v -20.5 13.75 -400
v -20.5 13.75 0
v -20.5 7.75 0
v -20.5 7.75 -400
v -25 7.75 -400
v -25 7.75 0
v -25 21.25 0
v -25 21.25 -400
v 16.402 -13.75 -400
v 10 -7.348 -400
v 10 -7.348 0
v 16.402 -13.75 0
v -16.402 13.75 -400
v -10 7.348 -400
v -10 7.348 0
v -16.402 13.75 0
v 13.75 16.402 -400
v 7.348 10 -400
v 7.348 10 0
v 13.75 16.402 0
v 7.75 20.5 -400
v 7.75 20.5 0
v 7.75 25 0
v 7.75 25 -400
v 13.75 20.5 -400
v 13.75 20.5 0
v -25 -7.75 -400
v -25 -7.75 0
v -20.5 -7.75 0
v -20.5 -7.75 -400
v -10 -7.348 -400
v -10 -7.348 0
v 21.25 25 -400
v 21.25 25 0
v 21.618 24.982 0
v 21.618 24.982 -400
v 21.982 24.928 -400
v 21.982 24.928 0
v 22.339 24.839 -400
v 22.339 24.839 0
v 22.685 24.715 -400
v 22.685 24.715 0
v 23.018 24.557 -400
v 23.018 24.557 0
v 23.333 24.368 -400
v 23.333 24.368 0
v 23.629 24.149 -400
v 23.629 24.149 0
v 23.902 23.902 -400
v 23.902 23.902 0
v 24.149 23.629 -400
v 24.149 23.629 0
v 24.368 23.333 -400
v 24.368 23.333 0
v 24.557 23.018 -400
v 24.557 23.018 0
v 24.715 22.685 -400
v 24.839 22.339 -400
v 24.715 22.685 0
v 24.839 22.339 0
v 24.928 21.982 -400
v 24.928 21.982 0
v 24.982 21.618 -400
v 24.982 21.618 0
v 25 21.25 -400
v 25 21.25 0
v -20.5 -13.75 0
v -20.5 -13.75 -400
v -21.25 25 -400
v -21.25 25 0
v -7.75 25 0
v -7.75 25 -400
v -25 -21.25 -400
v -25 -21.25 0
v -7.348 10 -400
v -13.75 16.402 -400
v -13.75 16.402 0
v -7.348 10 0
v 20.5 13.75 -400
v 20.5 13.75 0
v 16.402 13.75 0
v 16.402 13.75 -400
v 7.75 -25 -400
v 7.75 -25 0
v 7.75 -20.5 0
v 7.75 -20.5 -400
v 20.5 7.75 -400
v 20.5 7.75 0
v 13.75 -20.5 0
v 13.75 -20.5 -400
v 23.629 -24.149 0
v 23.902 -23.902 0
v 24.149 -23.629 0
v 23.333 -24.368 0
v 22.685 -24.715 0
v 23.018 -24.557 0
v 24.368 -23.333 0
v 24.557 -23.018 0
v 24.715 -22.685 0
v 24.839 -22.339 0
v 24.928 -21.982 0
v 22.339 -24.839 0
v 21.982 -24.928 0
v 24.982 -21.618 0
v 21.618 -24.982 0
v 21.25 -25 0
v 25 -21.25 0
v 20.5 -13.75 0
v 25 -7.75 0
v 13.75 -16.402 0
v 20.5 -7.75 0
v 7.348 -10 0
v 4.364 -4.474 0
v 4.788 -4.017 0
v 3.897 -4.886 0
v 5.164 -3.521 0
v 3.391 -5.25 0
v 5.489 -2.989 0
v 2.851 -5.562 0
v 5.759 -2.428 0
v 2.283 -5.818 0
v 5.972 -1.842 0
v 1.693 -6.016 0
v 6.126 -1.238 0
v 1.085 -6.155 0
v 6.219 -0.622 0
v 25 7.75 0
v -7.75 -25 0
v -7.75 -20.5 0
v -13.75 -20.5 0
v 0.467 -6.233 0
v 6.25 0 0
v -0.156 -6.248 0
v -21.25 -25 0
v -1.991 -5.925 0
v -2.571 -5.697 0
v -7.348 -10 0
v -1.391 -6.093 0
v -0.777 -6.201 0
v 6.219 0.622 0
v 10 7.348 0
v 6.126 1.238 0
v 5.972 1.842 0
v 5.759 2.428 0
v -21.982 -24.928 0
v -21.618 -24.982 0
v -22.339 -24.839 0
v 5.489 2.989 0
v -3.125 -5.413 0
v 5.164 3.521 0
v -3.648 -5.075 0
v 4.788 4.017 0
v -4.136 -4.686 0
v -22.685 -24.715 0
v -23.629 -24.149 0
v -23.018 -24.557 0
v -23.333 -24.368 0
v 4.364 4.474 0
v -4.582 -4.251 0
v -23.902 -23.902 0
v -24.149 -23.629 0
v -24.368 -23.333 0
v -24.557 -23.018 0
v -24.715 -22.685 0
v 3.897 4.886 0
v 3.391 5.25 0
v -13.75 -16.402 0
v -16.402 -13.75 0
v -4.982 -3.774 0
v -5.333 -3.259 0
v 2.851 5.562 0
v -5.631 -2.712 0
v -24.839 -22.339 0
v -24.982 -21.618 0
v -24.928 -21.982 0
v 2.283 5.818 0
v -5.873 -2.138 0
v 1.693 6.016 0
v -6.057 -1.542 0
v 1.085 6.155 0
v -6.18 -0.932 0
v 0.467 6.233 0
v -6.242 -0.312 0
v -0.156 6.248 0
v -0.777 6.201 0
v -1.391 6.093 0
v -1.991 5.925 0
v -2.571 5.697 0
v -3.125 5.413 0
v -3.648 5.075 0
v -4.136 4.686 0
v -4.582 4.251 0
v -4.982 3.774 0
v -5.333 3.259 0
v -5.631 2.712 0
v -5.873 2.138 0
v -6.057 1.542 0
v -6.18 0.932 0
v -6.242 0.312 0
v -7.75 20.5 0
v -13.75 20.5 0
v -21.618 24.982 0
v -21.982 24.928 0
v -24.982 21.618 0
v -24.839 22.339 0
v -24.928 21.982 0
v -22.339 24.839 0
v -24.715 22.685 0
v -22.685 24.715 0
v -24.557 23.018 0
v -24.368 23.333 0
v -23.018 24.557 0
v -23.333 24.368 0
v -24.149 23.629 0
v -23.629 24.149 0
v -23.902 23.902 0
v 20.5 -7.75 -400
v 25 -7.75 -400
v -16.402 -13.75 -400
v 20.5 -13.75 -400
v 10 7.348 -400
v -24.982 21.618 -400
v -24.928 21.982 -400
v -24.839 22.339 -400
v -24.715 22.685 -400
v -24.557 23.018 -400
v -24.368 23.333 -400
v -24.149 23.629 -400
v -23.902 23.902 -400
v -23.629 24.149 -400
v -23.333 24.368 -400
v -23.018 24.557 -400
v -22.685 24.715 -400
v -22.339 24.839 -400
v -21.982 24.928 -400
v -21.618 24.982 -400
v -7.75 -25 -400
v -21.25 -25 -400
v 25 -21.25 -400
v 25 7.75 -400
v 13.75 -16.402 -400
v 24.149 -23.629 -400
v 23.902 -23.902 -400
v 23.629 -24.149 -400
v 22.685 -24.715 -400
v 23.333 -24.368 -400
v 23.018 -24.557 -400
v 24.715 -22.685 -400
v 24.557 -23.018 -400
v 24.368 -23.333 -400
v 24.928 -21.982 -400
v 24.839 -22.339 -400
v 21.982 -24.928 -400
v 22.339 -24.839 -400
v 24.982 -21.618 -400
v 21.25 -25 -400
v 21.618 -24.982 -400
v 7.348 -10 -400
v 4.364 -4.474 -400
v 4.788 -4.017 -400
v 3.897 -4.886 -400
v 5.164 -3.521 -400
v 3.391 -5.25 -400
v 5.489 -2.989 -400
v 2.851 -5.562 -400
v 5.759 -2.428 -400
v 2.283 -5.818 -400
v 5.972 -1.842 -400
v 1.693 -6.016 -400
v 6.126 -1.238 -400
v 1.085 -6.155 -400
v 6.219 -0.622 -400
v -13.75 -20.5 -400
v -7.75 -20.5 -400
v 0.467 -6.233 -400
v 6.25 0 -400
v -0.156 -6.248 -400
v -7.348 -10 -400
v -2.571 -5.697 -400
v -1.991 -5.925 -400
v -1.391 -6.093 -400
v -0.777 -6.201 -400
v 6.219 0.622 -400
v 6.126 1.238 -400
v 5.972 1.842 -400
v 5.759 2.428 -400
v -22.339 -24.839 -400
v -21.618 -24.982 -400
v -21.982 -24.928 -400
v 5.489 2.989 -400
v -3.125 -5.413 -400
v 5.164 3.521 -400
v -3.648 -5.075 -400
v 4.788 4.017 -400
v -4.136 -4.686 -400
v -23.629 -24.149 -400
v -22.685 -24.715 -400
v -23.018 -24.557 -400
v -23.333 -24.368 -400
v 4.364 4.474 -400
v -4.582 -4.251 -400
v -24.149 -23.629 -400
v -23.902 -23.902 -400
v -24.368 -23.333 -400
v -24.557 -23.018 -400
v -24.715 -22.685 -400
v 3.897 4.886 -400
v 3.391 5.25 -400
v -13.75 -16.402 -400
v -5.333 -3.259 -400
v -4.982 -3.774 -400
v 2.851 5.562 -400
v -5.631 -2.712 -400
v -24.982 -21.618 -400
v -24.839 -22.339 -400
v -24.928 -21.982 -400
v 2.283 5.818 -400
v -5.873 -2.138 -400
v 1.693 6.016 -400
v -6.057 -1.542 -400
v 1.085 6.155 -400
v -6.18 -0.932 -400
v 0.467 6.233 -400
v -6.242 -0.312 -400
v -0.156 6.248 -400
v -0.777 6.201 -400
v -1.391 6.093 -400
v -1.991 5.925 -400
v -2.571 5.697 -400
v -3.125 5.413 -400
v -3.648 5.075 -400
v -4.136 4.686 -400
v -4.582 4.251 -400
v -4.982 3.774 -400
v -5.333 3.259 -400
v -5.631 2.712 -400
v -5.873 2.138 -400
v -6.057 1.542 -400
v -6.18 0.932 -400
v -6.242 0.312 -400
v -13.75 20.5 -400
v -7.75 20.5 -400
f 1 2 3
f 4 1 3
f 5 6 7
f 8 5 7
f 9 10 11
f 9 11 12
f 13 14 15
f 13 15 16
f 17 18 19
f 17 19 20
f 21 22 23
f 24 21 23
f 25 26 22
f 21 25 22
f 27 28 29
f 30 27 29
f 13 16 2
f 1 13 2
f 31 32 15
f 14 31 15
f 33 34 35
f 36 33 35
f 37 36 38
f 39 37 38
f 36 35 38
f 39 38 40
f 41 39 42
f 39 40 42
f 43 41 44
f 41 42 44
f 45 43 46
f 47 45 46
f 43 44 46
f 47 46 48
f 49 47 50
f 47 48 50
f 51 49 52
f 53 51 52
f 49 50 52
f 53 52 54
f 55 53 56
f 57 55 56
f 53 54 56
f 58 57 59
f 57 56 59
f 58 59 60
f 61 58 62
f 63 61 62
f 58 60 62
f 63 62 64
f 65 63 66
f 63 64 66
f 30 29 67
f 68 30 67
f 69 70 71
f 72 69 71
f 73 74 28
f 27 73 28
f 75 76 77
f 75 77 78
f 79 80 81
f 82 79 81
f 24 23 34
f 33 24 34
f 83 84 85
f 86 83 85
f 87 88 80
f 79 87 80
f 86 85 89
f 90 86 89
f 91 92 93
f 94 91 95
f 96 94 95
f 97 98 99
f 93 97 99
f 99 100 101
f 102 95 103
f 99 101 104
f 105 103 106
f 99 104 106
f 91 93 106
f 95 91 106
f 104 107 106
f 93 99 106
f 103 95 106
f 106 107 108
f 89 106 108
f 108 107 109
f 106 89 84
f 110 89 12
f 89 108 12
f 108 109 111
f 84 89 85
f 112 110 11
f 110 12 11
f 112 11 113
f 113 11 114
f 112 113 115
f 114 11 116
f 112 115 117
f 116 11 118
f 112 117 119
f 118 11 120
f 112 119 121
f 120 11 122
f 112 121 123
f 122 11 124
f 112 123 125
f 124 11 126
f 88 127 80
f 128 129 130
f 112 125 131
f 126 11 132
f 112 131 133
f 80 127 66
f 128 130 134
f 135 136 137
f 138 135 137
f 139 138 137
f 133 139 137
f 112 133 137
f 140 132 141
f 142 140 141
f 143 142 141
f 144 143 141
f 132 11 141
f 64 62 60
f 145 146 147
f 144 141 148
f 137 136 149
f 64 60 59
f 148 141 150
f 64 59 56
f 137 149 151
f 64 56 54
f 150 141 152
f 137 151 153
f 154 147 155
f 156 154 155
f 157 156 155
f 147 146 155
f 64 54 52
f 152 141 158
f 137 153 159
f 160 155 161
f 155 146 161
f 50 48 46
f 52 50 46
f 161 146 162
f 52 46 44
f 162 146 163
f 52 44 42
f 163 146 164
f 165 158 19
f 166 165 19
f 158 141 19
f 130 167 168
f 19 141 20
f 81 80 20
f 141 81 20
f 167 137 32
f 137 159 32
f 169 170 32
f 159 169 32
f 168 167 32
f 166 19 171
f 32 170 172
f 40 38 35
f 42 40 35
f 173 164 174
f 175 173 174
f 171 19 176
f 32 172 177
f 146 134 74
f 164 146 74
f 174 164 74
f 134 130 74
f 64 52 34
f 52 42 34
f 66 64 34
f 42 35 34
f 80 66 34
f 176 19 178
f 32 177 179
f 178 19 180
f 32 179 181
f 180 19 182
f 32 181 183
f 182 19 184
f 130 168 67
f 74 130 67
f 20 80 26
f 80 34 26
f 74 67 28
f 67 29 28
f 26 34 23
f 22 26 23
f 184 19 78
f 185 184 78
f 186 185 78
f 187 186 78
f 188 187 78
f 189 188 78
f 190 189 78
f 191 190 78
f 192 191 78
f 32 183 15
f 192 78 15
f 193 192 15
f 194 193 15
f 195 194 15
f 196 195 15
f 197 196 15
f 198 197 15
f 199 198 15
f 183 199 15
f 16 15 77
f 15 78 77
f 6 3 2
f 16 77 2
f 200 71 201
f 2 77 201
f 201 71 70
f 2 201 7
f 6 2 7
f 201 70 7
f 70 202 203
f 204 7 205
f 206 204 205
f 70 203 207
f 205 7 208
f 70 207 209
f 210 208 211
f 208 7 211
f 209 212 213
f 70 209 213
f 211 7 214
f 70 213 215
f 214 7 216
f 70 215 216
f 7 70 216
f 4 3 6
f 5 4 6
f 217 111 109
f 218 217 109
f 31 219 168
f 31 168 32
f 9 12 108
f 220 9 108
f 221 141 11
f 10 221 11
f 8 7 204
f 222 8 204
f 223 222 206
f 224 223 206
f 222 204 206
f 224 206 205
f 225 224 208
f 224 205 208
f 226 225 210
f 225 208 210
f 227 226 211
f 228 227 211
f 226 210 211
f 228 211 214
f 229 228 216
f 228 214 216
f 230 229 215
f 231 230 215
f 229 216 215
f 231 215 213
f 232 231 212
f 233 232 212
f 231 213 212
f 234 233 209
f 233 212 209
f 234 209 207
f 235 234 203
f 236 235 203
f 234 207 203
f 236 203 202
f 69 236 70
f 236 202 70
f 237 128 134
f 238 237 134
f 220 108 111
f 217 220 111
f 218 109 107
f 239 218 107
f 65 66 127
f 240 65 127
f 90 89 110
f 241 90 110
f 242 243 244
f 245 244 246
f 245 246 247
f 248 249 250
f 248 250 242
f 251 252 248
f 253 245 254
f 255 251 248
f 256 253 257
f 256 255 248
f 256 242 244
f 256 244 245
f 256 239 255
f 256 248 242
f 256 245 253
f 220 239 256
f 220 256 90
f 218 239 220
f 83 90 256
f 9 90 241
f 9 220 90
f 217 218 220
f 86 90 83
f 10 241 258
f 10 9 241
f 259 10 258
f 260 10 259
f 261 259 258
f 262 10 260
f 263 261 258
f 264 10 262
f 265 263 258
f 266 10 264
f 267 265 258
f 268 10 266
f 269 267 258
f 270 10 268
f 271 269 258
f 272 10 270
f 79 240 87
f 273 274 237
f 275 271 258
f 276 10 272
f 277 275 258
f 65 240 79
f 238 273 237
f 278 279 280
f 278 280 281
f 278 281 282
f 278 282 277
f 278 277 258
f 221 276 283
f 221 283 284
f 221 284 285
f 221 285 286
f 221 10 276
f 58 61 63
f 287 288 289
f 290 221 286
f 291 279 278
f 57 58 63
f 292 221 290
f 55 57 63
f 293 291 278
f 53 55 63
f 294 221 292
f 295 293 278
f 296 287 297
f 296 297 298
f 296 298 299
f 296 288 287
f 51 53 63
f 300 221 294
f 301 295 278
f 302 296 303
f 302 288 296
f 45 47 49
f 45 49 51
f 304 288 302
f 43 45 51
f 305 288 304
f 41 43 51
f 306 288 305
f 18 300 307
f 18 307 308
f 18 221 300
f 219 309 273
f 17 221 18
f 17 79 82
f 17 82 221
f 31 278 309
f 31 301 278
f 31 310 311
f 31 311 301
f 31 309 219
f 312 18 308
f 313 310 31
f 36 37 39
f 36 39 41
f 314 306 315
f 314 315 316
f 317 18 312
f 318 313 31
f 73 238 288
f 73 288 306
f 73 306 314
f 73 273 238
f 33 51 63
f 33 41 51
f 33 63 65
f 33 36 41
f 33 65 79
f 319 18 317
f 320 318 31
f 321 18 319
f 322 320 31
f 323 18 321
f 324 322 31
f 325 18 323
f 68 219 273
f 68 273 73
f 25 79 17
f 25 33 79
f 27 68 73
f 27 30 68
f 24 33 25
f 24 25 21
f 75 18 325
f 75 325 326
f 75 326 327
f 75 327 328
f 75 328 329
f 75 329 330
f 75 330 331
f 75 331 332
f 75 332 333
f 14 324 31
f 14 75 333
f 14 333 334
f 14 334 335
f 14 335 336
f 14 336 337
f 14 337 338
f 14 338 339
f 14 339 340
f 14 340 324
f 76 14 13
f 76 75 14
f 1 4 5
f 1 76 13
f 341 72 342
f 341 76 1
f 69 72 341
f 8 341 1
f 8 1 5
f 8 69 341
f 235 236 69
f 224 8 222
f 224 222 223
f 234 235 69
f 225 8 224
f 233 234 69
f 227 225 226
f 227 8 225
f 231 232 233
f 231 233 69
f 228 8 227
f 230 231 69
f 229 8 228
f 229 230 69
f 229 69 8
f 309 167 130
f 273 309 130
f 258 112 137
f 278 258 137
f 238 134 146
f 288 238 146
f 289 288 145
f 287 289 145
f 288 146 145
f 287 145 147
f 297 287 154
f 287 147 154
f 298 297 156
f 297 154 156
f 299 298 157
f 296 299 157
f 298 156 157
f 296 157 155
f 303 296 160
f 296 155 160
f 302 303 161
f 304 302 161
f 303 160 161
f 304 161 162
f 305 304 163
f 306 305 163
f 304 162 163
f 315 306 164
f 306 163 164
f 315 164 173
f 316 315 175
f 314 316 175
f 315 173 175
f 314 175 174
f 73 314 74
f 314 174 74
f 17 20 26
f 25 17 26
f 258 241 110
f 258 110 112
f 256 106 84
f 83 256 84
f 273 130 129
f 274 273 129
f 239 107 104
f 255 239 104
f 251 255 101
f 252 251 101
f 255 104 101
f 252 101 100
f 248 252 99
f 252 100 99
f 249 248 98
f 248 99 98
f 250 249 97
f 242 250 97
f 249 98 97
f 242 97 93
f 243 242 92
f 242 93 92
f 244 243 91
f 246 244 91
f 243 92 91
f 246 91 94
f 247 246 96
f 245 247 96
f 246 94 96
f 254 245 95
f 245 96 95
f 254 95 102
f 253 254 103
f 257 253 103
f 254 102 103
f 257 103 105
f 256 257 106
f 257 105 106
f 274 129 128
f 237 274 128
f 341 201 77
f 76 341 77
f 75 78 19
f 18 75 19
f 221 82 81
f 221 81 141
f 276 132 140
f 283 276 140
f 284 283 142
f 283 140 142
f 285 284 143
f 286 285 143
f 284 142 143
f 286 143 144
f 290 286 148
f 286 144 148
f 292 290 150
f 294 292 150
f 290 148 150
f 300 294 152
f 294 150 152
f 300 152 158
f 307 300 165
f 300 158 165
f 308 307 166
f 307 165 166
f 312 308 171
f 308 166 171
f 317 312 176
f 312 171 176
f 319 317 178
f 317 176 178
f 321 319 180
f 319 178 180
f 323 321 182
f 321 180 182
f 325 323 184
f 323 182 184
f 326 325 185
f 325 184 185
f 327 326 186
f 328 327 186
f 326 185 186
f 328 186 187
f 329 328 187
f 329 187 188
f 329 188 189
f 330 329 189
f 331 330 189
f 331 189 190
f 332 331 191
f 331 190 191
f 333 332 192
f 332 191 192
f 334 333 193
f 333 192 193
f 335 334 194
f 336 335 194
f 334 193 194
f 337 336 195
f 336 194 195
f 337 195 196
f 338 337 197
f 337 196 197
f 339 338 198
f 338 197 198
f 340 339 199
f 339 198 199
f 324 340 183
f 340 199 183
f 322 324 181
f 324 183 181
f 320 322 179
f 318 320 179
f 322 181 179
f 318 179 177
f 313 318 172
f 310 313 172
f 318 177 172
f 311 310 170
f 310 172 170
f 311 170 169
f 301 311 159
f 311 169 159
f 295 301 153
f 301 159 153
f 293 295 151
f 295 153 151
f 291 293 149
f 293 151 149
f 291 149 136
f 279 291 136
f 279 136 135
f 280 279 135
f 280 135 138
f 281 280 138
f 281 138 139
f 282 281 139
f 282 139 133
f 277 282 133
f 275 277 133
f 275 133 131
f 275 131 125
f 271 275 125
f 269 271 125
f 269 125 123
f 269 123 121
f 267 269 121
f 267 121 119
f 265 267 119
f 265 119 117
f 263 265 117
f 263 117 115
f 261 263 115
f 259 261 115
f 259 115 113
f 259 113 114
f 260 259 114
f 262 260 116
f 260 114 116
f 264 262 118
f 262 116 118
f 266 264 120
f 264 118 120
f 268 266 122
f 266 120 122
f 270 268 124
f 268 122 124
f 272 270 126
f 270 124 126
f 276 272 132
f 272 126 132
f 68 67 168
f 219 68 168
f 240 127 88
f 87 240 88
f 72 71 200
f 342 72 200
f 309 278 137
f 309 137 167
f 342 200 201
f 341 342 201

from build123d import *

# Parameters (mm, degrees)
SKETCH_1_R      = 2.5
EXTRUDE_2_DEPTH = 160
SCALE1_SCALE    = 2.5


with BuildPart() as part:
    # 草图1 → 凸台-拉伸2 (new body)
    with BuildSketch(Plane.XY):
        with BuildLine():
            Line((5.5, -8.2), (5.5, -6.560660172))
            Line((5.5, -6.560660172), (2.939339828, -4))
            Line((2.939339828, -4), (-2.939339828, -4))
            Line((-2.939339828, -4), (-5.5, -6.560660172))
            Line((-5.5, -6.560660172), (-5.5, -8.2))
            Line((-5.5, -8.2), (-3.1, -8.2))
            Line((-3.1, -8.2), (-3.1, -10))
            Line((-3.1, -10), (-8.5, -10))
            ThreePointArc((-8.5, -10), (-9.560660172, -9.560660172), (-10, -8.5))
            Line((-10, -8.5), (-10, -3.1))
            Line((-10, -3.1), (-8.2, -3.1))
            Line((-8.2, -3.1), (-8.2, -5.5))
            Line((-8.2, -5.5), (-6.560660172, -5.5))
            Line((-6.560660172, -5.5), (-4, -2.939339828))
            Line((-4, -2.939339828), (-4, 2.939339828))
            Line((-4, 2.939339828), (-6.560660172, 5.5))
            Line((-6.560660172, 5.5), (-8.2, 5.5))
            Line((-8.2, 5.5), (-8.2, 3.1))
            Line((-8.2, 3.1), (-10, 3.1))
            Line((-10, 3.1), (-10, 8.5))
            ThreePointArc((-10, 8.5), (-9.560660172, 9.560660172), (-8.5, 10))
            Line((-8.5, 10), (-3.1, 10))
            Line((-3.1, 10), (-3.1, 8.2))
            Line((-3.1, 8.2), (-5.5, 8.2))
            Line((-5.5, 8.2), (-5.5, 6.560660172))
            Line((-5.5, 6.560660172), (-2.939339828, 4))
            Line((-2.939339828, 4), (2.939339828, 4))
            Line((2.939339828, 4), (5.5, 6.560660172))
            Line((5.5, 6.560660172), (5.5, 8.2))
            Line((5.5, 8.2), (3.1, 8.2))
            Line((3.1, 8.2), (3.1, 10))
            Line((3.1, 10), (8.5, 10))
            ThreePointArc((8.5, 10), (9.560660172, 9.560660172), (10, 8.5))
            Line((10, 8.5), (10, 3.1))
            Line((10, 3.1), (8.2, 3.1))
            Line((8.2, 3.1), (8.2, 5.5))
            Line((8.2, 5.5), (6.560660172, 5.5))
            Line((6.560660172, 5.5), (4, 2.939339828))
            Line((4, 2.939339828), (4, -2.939339828))
            Line((4, -2.939339828), (6.560660172, -5.5))
            Line((6.560660172, -5.5), (8.2, -5.5))
            Line((8.2, -5.5), (8.2, -3.1))
            Line((8.2, -3.1), (10, -3.1))
            Line((10, -3.1), (10, -8.5))
            ThreePointArc((10, -8.5), (9.560660172, -9.560660172), (8.5, -10))
            Line((8.5, -10), (3.1, -10))
            Line((3.1, -10), (3.1, -8.2))
            Line((3.1, -8.2), (5.5, -8.2))
        make_face()
        Circle(SKETCH_1_R, mode=Mode.SUBTRACT)
    extrude(amount=-EXTRUDE_2_DEPTH)


with BuildPart() as part_1:
    # Scale1: scaled about (0, 0, 0)
    add(part.part.scale(SCALE1_SCALE))


solid = part_1.part
